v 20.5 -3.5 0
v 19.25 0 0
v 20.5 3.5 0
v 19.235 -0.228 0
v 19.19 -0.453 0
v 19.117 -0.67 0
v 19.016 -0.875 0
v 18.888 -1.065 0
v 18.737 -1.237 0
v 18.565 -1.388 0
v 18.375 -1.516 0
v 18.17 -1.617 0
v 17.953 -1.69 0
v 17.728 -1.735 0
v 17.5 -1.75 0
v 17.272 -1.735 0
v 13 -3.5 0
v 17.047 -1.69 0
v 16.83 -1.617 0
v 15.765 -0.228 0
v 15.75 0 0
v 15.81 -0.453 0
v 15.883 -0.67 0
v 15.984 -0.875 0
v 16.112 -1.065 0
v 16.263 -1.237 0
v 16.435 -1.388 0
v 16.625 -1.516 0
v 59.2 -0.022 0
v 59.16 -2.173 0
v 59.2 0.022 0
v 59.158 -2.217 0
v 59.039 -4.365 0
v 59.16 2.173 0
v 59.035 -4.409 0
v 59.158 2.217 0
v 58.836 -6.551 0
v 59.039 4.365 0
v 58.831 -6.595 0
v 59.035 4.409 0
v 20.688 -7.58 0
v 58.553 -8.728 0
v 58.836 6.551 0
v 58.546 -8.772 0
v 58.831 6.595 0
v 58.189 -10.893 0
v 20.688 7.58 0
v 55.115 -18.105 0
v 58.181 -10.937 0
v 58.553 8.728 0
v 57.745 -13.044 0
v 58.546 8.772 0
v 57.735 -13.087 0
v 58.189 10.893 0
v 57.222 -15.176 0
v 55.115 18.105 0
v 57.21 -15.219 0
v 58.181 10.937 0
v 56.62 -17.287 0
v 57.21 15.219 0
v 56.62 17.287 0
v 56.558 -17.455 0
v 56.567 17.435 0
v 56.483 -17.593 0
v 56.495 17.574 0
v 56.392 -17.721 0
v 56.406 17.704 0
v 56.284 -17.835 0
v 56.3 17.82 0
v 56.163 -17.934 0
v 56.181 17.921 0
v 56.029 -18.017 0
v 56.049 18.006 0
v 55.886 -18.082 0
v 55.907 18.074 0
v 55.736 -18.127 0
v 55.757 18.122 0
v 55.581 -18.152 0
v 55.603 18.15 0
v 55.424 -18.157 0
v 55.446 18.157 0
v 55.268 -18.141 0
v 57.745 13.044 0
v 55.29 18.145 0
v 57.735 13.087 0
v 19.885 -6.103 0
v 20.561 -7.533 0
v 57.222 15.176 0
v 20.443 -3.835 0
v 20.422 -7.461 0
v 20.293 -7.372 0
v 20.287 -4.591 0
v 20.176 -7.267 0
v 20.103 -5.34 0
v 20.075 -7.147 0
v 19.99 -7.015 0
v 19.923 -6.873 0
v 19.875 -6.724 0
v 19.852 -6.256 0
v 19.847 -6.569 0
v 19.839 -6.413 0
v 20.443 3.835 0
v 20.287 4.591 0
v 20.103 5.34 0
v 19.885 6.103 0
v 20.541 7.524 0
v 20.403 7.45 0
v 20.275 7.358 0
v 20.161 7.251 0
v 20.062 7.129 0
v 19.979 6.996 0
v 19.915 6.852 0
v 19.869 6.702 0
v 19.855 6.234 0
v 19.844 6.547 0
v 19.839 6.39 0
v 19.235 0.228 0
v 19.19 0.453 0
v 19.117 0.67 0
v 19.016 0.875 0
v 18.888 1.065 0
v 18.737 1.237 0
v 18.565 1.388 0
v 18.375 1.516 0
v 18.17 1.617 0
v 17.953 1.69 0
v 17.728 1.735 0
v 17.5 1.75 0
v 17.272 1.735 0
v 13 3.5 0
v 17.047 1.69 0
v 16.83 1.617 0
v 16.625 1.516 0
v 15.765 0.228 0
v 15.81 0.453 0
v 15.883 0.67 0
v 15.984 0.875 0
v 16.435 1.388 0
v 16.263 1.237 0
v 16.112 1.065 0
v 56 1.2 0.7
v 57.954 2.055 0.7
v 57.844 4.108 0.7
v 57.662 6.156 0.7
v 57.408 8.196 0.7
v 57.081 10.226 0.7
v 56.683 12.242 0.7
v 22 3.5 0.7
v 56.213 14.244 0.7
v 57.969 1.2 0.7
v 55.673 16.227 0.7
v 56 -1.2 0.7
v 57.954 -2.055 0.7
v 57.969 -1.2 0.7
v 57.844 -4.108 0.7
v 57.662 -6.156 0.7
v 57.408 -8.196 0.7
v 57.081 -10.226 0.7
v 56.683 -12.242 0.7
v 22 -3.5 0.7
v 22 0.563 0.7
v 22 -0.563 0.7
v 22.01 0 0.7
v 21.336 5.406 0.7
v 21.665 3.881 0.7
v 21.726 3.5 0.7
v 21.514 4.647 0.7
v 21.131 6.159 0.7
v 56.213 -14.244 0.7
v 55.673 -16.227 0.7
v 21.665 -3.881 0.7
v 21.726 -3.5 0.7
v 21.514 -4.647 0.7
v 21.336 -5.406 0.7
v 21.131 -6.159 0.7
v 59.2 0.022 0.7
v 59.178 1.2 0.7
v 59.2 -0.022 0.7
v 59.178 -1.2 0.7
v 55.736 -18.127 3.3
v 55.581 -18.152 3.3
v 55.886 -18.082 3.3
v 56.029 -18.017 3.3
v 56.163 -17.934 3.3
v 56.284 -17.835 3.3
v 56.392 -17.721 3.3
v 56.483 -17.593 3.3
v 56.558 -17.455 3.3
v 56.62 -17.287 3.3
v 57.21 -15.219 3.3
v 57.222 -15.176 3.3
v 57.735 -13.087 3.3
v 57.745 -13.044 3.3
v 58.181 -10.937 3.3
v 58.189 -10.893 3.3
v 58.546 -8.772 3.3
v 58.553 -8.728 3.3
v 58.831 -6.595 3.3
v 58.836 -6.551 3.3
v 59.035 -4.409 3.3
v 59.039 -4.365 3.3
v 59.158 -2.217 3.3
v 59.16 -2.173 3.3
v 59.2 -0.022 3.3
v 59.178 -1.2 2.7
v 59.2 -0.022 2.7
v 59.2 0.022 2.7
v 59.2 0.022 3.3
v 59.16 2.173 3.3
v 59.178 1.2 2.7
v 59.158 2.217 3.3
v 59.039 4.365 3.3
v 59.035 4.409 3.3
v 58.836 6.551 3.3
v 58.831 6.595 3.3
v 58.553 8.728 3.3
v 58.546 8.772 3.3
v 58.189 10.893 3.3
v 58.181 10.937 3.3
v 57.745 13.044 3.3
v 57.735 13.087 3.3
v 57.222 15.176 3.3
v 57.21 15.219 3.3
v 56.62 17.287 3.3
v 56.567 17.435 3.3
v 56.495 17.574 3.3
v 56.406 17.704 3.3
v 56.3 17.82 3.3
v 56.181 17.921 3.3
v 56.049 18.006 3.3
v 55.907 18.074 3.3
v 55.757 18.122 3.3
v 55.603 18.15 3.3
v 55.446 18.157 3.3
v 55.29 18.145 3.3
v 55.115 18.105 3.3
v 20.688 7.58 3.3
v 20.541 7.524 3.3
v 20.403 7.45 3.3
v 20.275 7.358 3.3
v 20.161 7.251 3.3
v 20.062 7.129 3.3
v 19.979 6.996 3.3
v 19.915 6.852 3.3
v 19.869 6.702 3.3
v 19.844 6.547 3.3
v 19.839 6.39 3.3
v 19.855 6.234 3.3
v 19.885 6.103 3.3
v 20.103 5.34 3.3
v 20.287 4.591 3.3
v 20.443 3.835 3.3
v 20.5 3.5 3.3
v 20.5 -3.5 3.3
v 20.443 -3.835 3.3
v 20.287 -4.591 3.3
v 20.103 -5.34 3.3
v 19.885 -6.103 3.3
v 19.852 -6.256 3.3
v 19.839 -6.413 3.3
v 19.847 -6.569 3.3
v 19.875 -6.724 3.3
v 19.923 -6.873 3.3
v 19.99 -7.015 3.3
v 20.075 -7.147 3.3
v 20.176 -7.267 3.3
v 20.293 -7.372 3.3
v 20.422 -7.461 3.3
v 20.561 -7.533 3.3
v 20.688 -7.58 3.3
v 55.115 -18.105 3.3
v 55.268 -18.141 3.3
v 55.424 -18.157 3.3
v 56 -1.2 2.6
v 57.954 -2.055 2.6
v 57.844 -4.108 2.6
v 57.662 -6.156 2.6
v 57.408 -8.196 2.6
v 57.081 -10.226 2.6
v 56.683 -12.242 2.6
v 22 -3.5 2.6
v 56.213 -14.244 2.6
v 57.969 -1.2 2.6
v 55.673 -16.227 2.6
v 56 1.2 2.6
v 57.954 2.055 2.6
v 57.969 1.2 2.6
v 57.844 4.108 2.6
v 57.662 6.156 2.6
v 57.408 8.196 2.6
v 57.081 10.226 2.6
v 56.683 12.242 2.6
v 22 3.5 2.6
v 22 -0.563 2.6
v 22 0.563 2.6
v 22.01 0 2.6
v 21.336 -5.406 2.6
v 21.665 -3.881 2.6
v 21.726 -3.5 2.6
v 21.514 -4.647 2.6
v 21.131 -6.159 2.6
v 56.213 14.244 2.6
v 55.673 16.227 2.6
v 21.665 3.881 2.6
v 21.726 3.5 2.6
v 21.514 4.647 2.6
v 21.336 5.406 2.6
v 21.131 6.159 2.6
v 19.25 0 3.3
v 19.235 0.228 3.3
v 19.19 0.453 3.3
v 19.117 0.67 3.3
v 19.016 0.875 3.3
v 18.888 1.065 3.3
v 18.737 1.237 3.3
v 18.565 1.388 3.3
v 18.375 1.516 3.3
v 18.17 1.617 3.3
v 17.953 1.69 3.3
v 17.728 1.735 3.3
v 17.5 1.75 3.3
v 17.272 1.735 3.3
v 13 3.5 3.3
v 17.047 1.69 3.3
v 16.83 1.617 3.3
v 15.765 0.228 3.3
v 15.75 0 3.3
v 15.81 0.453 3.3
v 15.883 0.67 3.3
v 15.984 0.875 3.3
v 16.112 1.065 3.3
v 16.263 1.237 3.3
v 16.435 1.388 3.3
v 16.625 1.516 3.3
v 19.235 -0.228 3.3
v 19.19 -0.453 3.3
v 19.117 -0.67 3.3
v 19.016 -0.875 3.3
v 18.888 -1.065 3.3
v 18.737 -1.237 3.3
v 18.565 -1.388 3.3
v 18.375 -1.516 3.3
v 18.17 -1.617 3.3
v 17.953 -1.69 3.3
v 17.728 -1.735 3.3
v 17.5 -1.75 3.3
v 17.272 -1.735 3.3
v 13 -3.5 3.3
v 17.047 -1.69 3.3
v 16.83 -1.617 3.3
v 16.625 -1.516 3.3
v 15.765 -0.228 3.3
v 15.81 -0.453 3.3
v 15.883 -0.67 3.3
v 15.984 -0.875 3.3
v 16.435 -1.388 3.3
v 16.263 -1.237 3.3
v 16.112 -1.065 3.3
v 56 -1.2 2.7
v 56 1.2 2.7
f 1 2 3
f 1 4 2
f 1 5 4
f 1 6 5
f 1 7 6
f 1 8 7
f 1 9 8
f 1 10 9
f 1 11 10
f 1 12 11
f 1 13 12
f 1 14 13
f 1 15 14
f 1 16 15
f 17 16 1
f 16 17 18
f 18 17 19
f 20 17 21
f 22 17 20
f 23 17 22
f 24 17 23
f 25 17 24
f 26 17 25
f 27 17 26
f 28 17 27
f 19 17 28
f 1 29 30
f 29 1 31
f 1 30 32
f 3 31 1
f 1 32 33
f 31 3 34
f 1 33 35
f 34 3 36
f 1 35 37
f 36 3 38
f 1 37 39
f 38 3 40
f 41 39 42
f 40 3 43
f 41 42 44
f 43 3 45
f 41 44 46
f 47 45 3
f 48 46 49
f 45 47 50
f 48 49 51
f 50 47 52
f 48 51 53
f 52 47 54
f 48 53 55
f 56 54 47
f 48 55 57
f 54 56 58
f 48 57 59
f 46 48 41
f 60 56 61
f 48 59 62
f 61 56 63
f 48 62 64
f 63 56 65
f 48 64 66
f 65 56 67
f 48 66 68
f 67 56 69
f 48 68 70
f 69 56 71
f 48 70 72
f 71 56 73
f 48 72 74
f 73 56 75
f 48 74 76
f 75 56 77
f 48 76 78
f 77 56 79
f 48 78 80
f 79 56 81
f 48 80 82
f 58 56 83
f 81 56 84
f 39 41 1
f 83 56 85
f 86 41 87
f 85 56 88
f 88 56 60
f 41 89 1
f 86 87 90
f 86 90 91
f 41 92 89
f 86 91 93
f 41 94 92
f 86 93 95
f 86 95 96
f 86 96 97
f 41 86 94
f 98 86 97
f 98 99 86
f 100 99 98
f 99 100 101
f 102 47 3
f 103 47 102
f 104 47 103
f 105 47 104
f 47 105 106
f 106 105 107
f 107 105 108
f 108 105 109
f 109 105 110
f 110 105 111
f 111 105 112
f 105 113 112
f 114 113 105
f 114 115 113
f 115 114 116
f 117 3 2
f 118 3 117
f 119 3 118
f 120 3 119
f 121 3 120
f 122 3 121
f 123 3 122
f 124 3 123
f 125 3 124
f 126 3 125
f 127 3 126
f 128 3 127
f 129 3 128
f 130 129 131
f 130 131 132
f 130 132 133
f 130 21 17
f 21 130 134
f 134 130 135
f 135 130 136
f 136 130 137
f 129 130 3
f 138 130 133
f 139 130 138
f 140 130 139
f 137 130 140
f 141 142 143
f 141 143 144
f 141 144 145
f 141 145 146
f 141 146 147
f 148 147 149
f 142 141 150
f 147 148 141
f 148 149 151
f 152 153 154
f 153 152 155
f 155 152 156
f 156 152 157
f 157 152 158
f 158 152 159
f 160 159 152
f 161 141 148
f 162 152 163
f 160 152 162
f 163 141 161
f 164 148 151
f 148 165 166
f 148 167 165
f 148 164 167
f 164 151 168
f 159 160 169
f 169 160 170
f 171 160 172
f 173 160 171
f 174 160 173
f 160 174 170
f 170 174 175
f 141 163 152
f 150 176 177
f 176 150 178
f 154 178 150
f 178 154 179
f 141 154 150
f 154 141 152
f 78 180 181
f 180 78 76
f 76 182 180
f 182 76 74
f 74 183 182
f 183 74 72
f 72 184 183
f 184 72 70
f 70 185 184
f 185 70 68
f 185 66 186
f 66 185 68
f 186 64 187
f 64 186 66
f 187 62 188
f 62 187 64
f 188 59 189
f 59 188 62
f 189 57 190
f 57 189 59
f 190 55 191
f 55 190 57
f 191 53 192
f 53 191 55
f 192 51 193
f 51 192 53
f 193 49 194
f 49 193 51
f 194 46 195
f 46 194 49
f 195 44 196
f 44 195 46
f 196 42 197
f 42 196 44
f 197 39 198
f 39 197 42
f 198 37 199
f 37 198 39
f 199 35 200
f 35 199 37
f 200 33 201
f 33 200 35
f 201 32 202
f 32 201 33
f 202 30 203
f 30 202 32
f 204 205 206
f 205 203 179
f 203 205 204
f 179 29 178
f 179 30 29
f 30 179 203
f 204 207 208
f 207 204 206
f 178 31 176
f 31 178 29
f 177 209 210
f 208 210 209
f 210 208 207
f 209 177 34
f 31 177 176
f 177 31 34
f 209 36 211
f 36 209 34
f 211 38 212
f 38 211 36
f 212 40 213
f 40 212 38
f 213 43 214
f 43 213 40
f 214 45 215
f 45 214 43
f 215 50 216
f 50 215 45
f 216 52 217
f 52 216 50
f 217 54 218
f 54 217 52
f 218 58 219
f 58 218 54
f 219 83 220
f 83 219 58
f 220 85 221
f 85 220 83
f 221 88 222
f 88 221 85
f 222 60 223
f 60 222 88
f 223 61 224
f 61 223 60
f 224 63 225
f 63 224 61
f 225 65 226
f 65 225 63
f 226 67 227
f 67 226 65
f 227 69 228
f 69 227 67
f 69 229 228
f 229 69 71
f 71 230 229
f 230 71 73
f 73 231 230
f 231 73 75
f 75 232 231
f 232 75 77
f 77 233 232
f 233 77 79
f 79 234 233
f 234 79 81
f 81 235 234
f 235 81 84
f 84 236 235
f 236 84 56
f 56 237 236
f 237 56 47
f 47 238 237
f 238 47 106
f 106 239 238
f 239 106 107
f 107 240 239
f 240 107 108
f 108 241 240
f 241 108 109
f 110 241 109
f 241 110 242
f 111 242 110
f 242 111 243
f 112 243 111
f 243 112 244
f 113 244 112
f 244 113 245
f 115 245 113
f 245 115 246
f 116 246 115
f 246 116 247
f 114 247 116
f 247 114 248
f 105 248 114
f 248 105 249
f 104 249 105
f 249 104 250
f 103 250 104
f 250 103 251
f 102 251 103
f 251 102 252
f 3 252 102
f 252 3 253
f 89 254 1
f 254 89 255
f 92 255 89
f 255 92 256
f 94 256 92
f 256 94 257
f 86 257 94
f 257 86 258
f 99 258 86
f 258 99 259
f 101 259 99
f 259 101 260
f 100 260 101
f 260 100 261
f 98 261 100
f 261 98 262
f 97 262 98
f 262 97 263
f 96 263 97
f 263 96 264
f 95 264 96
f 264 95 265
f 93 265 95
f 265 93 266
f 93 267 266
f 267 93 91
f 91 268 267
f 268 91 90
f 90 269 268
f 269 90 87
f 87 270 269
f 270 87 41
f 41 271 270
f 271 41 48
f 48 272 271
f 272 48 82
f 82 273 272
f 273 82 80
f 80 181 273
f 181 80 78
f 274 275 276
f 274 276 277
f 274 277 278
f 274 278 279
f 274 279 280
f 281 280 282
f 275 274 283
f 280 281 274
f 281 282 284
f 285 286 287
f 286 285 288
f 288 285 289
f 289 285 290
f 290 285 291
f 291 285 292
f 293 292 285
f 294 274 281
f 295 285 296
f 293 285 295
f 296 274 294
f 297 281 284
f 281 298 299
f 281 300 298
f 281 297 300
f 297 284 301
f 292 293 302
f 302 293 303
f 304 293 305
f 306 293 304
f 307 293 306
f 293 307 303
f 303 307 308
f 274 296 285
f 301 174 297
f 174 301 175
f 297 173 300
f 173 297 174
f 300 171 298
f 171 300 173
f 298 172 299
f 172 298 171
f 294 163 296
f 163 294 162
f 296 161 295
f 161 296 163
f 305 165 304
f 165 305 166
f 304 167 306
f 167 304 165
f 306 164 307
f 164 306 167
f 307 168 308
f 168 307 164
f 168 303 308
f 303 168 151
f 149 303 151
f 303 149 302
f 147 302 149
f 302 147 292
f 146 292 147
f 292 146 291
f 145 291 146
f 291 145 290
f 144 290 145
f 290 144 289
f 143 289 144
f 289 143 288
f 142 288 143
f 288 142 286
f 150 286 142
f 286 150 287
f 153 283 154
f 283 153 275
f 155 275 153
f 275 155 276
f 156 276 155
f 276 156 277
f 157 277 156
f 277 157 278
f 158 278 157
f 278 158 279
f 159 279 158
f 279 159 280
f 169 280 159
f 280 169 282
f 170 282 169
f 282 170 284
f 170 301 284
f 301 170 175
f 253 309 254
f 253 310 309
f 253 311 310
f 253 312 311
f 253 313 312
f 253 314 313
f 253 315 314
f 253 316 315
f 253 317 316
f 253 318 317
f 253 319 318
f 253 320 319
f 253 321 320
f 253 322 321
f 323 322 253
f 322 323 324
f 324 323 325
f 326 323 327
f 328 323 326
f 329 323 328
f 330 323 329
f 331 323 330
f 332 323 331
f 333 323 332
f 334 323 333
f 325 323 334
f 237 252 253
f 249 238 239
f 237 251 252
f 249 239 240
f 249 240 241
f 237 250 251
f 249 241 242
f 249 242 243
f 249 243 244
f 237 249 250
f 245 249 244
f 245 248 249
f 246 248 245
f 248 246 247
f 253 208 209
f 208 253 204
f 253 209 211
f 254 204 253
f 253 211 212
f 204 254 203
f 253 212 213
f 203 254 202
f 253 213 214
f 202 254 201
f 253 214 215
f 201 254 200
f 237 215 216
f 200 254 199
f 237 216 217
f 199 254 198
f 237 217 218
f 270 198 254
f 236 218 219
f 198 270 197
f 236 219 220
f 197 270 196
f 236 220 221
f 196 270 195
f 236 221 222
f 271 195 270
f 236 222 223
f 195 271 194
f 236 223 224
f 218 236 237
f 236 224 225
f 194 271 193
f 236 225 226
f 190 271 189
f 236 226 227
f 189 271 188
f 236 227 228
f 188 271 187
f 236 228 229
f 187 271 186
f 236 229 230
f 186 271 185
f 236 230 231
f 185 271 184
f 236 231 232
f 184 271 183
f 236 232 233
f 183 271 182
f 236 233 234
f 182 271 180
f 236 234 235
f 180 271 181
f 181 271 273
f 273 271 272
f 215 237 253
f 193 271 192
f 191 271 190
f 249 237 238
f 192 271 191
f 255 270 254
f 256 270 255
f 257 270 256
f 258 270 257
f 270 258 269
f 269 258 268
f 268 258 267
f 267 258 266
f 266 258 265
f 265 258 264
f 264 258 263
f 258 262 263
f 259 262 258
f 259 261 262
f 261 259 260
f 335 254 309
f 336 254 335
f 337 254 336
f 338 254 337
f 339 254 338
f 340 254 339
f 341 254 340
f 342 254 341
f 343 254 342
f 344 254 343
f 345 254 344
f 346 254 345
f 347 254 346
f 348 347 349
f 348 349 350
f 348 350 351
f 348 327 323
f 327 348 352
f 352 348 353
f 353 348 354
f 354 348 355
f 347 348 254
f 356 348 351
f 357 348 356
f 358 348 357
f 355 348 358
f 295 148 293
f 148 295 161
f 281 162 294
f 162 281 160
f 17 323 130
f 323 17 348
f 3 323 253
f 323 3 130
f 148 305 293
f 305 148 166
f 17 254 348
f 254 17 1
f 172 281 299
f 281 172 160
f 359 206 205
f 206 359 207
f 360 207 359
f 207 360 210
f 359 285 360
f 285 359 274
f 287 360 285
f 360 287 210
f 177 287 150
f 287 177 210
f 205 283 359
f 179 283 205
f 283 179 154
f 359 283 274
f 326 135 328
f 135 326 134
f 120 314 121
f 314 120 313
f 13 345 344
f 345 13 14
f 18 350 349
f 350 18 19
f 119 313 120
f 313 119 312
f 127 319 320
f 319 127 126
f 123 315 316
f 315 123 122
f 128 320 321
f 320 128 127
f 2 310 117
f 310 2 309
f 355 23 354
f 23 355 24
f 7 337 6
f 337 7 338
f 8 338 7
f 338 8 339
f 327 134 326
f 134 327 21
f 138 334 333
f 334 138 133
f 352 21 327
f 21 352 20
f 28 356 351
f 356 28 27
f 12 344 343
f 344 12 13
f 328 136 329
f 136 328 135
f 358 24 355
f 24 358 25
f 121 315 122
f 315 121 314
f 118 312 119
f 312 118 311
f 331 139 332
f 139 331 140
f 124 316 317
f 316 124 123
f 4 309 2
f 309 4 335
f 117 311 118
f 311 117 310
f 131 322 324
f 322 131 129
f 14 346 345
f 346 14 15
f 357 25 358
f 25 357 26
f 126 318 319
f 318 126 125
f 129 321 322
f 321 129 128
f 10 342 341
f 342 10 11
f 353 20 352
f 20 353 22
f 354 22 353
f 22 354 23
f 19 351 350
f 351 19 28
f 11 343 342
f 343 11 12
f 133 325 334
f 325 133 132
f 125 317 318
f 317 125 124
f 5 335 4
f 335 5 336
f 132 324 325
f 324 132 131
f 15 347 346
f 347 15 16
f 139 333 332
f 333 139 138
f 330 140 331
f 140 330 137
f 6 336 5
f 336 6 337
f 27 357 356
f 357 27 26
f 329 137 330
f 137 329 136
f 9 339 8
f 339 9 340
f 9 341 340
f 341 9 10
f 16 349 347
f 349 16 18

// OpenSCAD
// file: parameters.scad
// =============================================================================
// Gen-Z Dual-stator mid-rotor Halbach sandwich — WOUND-AWARE (HARD GATE)
// ONE mid rotor (magnets both faces) | TWO wound pancake stators | outer endbells
// =============================================================================

wire_awg            = 26;
wire_od             = 0.45;
turns               = 115;      // 9 coils/stator ×2 = 18 ×115 ×~0.11 ≈ 228 m
fill                = 0.70;
layers_per_face     = 2;
wind_build_axial    = layers_per_face * wire_od * fill;   // 0.63
wind_build_radial   = 2.8 * wire_od * fill;               // 0.882

coil_id_r           = 22.0;
coil_od_r           = 58.0;
span_deg            = 34.0;     // 9 stations × 40°
former_web          = 1.9;
flange_t            = 0.70;
wall                = 1.2;
slot_w              = 2.4;
mount_hole          = 3.5;
tab_len             = 7.0;

former_bare_h       = former_web + 2 * flange_t;            // 3.3
coil_envelope_h     = former_bare_h + 2 * wind_build_axial; // 4.56

run_clear           = 0.65;
gap_spacer_h        = run_clear + wind_build_axial;         // 1.28
m2m                 = coil_envelope_h + 2 * run_clear;      // 5.86 per gap

coil_stations       = 9;        // per stator; ×2 = 18 total
bay_r_in            = coil_id_r - 2.0 - wind_build_radial;
bay_r_out           = coil_od_r + 2.0 + wind_build_radial;
bay_span            = span_deg + 4.0;
bay_offset          = 2.0;
bay_depth           = former_bare_h + wind_build_axial;
stator_back_web     = 2.0;
stator_thick        = bay_depth + stator_back_web;
stator_od           = 156.0;
shaft_clear_stator  = 40.0;
coil_mount_r        = 30.0;

large_pocket_d      = 20.3;
small_pocket_d      = 5.3;
pocket_h            = 5.2;
large_n             = 8;
R_large             = 52.0;
R_small_inner       = 40.0;
R_small_mid         = 52.0;
R_small_outer       = 64.0;
carrier_od          = 152.0;
mid_carrier_thick   = 12.0;
hub_h               = 10.0;
hub_od              = 30.0;
rotor_b_offset_deg  = 22.5;

shaft_bore          = 8.35;
bearing_d           = 21.85;
bearing_h           = 7.2;
m3_clear            = 3.5;
bolt_r_inner        = 36.0;
bolt_n_inner        = 6;
flange_bolt_r       = 72.0;
flange_bolt_n       = 6;
brace_r             = 68.0;
brace_d             = 4.3;
brace_n             = 4;

spacer_pad_od       = 14.0;
spacer_pad_id       = m3_clear;
endbell_od          = 156.0;
endbell_thick       = 8.0;
endbell_shaft_clear = 10.0;

$fn = 64;
// main file
// Gen-Z pancake former — print ×18
// WOUND: wind_build_axial computed in parameters.scad; wind BEFORE assembly
include <parameters.scad>;
$fn = 48;

module sector_2d(r_in, r_out, ang) {
    polygon([
        for (a = [-ang/2 : ang/16 : ang/2]) [r_in*cos(a), r_in*sin(a)],
        for (a = [ang/2 : -ang/16 : -ang/2]) [r_out*cos(a), r_out*sin(a)]
    ]);
}
module flange() {
    linear_extrude(flange_t) offset(r=wall) sector_2d(coil_id_r, coil_od_r, span_deg);
}
difference() {
    union() {
        flange();
        translate([0, 0, flange_t])
            linear_extrude(former_web)
                difference() {
                    offset(r=wall) sector_2d(coil_id_r, coil_od_r, span_deg);
                    sector_2d(coil_id_r + 0.01, coil_od_r - 0.01, span_deg - 1.5);
                }
        translate([0, 0, flange_t + former_web]) flange();
        translate([coil_id_r - tab_len - 2, -3.5, 0])
            cube([tab_len + 2, 7, former_bare_h]);
    }
    translate([coil_od_r - 2, -slot_w/2, flange_t])
        cube([wall + 4, slot_w, former_web + 0.1]);
    translate([coil_id_r - tab_len/2 - 1, 0, -0.1])
        cylinder(d=mount_hole, h=former_bare_h + 1);
}
